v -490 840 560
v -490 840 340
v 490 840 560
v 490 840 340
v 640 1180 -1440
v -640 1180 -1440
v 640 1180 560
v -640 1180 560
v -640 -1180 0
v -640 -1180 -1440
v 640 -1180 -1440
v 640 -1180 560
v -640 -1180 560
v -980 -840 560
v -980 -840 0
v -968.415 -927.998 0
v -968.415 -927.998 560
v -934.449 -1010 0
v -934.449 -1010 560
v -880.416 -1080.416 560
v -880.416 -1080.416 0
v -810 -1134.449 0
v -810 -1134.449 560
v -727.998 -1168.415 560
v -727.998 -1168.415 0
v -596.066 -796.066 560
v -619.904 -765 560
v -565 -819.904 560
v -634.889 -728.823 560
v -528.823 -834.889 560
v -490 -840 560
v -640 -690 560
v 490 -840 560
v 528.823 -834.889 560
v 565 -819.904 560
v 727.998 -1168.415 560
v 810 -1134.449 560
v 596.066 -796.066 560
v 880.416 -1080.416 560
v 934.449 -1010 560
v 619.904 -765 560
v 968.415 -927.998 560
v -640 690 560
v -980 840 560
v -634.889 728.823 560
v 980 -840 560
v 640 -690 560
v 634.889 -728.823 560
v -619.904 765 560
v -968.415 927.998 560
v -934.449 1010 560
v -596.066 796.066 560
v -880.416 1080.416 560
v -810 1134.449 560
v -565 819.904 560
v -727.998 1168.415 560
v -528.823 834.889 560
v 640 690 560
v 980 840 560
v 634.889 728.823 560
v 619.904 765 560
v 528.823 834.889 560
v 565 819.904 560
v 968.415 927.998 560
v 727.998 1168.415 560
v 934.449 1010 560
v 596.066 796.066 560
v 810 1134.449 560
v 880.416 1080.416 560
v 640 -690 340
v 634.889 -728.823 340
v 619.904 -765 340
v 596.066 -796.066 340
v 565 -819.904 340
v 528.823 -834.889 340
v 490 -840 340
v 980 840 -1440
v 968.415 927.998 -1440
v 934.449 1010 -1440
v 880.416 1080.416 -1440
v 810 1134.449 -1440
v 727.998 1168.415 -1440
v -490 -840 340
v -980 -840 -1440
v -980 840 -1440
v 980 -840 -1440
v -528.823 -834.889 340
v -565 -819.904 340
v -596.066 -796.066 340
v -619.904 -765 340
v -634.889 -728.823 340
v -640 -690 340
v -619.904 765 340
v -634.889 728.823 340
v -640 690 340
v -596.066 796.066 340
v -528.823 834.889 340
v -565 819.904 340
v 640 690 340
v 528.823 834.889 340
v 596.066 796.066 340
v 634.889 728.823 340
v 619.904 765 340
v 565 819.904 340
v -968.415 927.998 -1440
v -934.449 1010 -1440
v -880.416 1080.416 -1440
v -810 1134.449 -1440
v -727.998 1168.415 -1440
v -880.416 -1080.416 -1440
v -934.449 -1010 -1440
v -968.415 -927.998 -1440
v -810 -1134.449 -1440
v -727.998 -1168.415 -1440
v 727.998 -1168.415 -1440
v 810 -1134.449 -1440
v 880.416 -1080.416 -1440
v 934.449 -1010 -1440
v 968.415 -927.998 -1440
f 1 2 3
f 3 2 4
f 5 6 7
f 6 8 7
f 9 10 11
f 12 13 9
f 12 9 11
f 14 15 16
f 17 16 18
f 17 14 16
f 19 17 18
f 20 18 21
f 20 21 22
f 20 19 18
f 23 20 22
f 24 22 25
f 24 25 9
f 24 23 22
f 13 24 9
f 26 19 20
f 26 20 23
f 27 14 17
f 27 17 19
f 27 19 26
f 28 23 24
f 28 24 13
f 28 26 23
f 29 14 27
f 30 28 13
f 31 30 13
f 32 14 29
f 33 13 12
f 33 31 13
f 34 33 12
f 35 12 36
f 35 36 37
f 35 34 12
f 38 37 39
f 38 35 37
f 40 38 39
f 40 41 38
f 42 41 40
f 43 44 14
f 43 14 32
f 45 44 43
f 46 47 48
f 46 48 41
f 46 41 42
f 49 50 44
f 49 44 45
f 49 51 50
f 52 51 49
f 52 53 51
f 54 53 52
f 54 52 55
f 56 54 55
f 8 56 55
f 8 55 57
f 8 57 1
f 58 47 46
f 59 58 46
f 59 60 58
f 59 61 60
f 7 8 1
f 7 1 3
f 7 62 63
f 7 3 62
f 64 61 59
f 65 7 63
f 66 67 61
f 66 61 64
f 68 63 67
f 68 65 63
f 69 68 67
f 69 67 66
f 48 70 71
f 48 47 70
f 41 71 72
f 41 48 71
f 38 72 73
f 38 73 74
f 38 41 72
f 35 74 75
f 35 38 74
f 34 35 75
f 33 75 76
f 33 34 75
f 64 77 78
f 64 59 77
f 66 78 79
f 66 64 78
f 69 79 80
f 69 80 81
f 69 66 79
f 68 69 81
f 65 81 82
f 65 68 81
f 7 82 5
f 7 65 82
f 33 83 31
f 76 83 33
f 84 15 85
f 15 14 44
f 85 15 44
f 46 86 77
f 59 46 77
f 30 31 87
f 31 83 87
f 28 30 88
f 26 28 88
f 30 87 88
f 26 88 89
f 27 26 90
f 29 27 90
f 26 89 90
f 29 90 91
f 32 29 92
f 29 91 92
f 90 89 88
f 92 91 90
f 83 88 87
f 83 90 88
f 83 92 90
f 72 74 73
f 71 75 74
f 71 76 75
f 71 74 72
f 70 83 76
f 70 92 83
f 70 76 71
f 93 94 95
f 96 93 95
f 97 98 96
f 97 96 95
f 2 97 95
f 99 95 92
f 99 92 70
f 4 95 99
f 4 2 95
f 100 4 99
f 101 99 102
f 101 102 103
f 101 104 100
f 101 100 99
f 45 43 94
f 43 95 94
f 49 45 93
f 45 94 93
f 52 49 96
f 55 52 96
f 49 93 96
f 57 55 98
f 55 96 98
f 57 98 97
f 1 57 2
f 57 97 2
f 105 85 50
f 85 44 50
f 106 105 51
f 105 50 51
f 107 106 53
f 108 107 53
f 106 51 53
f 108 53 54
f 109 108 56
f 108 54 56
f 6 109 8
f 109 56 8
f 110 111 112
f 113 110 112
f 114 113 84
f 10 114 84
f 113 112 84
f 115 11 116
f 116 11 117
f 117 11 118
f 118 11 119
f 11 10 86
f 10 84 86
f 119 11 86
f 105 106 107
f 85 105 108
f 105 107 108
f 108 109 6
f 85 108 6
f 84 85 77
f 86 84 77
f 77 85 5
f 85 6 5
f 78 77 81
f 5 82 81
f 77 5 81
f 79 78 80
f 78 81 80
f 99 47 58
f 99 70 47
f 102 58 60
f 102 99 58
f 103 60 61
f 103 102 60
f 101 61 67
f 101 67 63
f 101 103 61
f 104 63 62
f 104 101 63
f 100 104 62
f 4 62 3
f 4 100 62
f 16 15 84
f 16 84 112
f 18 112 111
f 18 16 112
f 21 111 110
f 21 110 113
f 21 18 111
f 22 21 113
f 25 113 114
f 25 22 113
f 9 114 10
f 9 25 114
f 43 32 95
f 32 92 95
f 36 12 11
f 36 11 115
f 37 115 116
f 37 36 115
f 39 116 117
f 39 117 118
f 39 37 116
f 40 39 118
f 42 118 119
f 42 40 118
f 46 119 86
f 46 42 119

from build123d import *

# Parameters (mm, degrees)
F0_W     = 1960
F0_H     = 2360
F1_DEPTH = 560
F2_T     = -340
F3_R     = 340
F4_R     = 150
F5_DEPTH = 1440


with BuildPart() as f1:
    # F0 (on Top) → F1 (new body)
    with BuildSketch(Plane.XY):
        Rectangle(F0_W, F0_H)
    extrude(amount=F1_DEPTH)

    # F2
    f2_openings = [f1.faces().sort_by_distance(p)[0] for p in [
        (0, 0, 560),
    ]]
    offset(amount=F2_T, openings=f2_openings)

    # F3
    f3_edges = [f1.edges().sort_by_distance(p)[0] for p in [
        (-980, 1180, 280),
        (980, 1180, 280),
        (-980, -1180, 280),
        (980, -1180, 280),
    ]]
    fillet(f3_edges, radius=F3_R)

    # F4
    f4_edges = [f1.edges().sort_by_distance(p)[0] for p in [
        (640, 840, 450),
        (640, -840, 450),
        (-640, -840, 450),
        (-640, 840, 450),
    ]]
    fillet(f4_edges, radius=F4_R)

    # F5 (add): a face of the model
    f5_faces = [f1.faces().sort_by_distance(p)[0] for p in [
        (0, 0, 0),
    ]]
    extrude(f5_faces, amount=F5_DEPTH)


solid = f1.part
